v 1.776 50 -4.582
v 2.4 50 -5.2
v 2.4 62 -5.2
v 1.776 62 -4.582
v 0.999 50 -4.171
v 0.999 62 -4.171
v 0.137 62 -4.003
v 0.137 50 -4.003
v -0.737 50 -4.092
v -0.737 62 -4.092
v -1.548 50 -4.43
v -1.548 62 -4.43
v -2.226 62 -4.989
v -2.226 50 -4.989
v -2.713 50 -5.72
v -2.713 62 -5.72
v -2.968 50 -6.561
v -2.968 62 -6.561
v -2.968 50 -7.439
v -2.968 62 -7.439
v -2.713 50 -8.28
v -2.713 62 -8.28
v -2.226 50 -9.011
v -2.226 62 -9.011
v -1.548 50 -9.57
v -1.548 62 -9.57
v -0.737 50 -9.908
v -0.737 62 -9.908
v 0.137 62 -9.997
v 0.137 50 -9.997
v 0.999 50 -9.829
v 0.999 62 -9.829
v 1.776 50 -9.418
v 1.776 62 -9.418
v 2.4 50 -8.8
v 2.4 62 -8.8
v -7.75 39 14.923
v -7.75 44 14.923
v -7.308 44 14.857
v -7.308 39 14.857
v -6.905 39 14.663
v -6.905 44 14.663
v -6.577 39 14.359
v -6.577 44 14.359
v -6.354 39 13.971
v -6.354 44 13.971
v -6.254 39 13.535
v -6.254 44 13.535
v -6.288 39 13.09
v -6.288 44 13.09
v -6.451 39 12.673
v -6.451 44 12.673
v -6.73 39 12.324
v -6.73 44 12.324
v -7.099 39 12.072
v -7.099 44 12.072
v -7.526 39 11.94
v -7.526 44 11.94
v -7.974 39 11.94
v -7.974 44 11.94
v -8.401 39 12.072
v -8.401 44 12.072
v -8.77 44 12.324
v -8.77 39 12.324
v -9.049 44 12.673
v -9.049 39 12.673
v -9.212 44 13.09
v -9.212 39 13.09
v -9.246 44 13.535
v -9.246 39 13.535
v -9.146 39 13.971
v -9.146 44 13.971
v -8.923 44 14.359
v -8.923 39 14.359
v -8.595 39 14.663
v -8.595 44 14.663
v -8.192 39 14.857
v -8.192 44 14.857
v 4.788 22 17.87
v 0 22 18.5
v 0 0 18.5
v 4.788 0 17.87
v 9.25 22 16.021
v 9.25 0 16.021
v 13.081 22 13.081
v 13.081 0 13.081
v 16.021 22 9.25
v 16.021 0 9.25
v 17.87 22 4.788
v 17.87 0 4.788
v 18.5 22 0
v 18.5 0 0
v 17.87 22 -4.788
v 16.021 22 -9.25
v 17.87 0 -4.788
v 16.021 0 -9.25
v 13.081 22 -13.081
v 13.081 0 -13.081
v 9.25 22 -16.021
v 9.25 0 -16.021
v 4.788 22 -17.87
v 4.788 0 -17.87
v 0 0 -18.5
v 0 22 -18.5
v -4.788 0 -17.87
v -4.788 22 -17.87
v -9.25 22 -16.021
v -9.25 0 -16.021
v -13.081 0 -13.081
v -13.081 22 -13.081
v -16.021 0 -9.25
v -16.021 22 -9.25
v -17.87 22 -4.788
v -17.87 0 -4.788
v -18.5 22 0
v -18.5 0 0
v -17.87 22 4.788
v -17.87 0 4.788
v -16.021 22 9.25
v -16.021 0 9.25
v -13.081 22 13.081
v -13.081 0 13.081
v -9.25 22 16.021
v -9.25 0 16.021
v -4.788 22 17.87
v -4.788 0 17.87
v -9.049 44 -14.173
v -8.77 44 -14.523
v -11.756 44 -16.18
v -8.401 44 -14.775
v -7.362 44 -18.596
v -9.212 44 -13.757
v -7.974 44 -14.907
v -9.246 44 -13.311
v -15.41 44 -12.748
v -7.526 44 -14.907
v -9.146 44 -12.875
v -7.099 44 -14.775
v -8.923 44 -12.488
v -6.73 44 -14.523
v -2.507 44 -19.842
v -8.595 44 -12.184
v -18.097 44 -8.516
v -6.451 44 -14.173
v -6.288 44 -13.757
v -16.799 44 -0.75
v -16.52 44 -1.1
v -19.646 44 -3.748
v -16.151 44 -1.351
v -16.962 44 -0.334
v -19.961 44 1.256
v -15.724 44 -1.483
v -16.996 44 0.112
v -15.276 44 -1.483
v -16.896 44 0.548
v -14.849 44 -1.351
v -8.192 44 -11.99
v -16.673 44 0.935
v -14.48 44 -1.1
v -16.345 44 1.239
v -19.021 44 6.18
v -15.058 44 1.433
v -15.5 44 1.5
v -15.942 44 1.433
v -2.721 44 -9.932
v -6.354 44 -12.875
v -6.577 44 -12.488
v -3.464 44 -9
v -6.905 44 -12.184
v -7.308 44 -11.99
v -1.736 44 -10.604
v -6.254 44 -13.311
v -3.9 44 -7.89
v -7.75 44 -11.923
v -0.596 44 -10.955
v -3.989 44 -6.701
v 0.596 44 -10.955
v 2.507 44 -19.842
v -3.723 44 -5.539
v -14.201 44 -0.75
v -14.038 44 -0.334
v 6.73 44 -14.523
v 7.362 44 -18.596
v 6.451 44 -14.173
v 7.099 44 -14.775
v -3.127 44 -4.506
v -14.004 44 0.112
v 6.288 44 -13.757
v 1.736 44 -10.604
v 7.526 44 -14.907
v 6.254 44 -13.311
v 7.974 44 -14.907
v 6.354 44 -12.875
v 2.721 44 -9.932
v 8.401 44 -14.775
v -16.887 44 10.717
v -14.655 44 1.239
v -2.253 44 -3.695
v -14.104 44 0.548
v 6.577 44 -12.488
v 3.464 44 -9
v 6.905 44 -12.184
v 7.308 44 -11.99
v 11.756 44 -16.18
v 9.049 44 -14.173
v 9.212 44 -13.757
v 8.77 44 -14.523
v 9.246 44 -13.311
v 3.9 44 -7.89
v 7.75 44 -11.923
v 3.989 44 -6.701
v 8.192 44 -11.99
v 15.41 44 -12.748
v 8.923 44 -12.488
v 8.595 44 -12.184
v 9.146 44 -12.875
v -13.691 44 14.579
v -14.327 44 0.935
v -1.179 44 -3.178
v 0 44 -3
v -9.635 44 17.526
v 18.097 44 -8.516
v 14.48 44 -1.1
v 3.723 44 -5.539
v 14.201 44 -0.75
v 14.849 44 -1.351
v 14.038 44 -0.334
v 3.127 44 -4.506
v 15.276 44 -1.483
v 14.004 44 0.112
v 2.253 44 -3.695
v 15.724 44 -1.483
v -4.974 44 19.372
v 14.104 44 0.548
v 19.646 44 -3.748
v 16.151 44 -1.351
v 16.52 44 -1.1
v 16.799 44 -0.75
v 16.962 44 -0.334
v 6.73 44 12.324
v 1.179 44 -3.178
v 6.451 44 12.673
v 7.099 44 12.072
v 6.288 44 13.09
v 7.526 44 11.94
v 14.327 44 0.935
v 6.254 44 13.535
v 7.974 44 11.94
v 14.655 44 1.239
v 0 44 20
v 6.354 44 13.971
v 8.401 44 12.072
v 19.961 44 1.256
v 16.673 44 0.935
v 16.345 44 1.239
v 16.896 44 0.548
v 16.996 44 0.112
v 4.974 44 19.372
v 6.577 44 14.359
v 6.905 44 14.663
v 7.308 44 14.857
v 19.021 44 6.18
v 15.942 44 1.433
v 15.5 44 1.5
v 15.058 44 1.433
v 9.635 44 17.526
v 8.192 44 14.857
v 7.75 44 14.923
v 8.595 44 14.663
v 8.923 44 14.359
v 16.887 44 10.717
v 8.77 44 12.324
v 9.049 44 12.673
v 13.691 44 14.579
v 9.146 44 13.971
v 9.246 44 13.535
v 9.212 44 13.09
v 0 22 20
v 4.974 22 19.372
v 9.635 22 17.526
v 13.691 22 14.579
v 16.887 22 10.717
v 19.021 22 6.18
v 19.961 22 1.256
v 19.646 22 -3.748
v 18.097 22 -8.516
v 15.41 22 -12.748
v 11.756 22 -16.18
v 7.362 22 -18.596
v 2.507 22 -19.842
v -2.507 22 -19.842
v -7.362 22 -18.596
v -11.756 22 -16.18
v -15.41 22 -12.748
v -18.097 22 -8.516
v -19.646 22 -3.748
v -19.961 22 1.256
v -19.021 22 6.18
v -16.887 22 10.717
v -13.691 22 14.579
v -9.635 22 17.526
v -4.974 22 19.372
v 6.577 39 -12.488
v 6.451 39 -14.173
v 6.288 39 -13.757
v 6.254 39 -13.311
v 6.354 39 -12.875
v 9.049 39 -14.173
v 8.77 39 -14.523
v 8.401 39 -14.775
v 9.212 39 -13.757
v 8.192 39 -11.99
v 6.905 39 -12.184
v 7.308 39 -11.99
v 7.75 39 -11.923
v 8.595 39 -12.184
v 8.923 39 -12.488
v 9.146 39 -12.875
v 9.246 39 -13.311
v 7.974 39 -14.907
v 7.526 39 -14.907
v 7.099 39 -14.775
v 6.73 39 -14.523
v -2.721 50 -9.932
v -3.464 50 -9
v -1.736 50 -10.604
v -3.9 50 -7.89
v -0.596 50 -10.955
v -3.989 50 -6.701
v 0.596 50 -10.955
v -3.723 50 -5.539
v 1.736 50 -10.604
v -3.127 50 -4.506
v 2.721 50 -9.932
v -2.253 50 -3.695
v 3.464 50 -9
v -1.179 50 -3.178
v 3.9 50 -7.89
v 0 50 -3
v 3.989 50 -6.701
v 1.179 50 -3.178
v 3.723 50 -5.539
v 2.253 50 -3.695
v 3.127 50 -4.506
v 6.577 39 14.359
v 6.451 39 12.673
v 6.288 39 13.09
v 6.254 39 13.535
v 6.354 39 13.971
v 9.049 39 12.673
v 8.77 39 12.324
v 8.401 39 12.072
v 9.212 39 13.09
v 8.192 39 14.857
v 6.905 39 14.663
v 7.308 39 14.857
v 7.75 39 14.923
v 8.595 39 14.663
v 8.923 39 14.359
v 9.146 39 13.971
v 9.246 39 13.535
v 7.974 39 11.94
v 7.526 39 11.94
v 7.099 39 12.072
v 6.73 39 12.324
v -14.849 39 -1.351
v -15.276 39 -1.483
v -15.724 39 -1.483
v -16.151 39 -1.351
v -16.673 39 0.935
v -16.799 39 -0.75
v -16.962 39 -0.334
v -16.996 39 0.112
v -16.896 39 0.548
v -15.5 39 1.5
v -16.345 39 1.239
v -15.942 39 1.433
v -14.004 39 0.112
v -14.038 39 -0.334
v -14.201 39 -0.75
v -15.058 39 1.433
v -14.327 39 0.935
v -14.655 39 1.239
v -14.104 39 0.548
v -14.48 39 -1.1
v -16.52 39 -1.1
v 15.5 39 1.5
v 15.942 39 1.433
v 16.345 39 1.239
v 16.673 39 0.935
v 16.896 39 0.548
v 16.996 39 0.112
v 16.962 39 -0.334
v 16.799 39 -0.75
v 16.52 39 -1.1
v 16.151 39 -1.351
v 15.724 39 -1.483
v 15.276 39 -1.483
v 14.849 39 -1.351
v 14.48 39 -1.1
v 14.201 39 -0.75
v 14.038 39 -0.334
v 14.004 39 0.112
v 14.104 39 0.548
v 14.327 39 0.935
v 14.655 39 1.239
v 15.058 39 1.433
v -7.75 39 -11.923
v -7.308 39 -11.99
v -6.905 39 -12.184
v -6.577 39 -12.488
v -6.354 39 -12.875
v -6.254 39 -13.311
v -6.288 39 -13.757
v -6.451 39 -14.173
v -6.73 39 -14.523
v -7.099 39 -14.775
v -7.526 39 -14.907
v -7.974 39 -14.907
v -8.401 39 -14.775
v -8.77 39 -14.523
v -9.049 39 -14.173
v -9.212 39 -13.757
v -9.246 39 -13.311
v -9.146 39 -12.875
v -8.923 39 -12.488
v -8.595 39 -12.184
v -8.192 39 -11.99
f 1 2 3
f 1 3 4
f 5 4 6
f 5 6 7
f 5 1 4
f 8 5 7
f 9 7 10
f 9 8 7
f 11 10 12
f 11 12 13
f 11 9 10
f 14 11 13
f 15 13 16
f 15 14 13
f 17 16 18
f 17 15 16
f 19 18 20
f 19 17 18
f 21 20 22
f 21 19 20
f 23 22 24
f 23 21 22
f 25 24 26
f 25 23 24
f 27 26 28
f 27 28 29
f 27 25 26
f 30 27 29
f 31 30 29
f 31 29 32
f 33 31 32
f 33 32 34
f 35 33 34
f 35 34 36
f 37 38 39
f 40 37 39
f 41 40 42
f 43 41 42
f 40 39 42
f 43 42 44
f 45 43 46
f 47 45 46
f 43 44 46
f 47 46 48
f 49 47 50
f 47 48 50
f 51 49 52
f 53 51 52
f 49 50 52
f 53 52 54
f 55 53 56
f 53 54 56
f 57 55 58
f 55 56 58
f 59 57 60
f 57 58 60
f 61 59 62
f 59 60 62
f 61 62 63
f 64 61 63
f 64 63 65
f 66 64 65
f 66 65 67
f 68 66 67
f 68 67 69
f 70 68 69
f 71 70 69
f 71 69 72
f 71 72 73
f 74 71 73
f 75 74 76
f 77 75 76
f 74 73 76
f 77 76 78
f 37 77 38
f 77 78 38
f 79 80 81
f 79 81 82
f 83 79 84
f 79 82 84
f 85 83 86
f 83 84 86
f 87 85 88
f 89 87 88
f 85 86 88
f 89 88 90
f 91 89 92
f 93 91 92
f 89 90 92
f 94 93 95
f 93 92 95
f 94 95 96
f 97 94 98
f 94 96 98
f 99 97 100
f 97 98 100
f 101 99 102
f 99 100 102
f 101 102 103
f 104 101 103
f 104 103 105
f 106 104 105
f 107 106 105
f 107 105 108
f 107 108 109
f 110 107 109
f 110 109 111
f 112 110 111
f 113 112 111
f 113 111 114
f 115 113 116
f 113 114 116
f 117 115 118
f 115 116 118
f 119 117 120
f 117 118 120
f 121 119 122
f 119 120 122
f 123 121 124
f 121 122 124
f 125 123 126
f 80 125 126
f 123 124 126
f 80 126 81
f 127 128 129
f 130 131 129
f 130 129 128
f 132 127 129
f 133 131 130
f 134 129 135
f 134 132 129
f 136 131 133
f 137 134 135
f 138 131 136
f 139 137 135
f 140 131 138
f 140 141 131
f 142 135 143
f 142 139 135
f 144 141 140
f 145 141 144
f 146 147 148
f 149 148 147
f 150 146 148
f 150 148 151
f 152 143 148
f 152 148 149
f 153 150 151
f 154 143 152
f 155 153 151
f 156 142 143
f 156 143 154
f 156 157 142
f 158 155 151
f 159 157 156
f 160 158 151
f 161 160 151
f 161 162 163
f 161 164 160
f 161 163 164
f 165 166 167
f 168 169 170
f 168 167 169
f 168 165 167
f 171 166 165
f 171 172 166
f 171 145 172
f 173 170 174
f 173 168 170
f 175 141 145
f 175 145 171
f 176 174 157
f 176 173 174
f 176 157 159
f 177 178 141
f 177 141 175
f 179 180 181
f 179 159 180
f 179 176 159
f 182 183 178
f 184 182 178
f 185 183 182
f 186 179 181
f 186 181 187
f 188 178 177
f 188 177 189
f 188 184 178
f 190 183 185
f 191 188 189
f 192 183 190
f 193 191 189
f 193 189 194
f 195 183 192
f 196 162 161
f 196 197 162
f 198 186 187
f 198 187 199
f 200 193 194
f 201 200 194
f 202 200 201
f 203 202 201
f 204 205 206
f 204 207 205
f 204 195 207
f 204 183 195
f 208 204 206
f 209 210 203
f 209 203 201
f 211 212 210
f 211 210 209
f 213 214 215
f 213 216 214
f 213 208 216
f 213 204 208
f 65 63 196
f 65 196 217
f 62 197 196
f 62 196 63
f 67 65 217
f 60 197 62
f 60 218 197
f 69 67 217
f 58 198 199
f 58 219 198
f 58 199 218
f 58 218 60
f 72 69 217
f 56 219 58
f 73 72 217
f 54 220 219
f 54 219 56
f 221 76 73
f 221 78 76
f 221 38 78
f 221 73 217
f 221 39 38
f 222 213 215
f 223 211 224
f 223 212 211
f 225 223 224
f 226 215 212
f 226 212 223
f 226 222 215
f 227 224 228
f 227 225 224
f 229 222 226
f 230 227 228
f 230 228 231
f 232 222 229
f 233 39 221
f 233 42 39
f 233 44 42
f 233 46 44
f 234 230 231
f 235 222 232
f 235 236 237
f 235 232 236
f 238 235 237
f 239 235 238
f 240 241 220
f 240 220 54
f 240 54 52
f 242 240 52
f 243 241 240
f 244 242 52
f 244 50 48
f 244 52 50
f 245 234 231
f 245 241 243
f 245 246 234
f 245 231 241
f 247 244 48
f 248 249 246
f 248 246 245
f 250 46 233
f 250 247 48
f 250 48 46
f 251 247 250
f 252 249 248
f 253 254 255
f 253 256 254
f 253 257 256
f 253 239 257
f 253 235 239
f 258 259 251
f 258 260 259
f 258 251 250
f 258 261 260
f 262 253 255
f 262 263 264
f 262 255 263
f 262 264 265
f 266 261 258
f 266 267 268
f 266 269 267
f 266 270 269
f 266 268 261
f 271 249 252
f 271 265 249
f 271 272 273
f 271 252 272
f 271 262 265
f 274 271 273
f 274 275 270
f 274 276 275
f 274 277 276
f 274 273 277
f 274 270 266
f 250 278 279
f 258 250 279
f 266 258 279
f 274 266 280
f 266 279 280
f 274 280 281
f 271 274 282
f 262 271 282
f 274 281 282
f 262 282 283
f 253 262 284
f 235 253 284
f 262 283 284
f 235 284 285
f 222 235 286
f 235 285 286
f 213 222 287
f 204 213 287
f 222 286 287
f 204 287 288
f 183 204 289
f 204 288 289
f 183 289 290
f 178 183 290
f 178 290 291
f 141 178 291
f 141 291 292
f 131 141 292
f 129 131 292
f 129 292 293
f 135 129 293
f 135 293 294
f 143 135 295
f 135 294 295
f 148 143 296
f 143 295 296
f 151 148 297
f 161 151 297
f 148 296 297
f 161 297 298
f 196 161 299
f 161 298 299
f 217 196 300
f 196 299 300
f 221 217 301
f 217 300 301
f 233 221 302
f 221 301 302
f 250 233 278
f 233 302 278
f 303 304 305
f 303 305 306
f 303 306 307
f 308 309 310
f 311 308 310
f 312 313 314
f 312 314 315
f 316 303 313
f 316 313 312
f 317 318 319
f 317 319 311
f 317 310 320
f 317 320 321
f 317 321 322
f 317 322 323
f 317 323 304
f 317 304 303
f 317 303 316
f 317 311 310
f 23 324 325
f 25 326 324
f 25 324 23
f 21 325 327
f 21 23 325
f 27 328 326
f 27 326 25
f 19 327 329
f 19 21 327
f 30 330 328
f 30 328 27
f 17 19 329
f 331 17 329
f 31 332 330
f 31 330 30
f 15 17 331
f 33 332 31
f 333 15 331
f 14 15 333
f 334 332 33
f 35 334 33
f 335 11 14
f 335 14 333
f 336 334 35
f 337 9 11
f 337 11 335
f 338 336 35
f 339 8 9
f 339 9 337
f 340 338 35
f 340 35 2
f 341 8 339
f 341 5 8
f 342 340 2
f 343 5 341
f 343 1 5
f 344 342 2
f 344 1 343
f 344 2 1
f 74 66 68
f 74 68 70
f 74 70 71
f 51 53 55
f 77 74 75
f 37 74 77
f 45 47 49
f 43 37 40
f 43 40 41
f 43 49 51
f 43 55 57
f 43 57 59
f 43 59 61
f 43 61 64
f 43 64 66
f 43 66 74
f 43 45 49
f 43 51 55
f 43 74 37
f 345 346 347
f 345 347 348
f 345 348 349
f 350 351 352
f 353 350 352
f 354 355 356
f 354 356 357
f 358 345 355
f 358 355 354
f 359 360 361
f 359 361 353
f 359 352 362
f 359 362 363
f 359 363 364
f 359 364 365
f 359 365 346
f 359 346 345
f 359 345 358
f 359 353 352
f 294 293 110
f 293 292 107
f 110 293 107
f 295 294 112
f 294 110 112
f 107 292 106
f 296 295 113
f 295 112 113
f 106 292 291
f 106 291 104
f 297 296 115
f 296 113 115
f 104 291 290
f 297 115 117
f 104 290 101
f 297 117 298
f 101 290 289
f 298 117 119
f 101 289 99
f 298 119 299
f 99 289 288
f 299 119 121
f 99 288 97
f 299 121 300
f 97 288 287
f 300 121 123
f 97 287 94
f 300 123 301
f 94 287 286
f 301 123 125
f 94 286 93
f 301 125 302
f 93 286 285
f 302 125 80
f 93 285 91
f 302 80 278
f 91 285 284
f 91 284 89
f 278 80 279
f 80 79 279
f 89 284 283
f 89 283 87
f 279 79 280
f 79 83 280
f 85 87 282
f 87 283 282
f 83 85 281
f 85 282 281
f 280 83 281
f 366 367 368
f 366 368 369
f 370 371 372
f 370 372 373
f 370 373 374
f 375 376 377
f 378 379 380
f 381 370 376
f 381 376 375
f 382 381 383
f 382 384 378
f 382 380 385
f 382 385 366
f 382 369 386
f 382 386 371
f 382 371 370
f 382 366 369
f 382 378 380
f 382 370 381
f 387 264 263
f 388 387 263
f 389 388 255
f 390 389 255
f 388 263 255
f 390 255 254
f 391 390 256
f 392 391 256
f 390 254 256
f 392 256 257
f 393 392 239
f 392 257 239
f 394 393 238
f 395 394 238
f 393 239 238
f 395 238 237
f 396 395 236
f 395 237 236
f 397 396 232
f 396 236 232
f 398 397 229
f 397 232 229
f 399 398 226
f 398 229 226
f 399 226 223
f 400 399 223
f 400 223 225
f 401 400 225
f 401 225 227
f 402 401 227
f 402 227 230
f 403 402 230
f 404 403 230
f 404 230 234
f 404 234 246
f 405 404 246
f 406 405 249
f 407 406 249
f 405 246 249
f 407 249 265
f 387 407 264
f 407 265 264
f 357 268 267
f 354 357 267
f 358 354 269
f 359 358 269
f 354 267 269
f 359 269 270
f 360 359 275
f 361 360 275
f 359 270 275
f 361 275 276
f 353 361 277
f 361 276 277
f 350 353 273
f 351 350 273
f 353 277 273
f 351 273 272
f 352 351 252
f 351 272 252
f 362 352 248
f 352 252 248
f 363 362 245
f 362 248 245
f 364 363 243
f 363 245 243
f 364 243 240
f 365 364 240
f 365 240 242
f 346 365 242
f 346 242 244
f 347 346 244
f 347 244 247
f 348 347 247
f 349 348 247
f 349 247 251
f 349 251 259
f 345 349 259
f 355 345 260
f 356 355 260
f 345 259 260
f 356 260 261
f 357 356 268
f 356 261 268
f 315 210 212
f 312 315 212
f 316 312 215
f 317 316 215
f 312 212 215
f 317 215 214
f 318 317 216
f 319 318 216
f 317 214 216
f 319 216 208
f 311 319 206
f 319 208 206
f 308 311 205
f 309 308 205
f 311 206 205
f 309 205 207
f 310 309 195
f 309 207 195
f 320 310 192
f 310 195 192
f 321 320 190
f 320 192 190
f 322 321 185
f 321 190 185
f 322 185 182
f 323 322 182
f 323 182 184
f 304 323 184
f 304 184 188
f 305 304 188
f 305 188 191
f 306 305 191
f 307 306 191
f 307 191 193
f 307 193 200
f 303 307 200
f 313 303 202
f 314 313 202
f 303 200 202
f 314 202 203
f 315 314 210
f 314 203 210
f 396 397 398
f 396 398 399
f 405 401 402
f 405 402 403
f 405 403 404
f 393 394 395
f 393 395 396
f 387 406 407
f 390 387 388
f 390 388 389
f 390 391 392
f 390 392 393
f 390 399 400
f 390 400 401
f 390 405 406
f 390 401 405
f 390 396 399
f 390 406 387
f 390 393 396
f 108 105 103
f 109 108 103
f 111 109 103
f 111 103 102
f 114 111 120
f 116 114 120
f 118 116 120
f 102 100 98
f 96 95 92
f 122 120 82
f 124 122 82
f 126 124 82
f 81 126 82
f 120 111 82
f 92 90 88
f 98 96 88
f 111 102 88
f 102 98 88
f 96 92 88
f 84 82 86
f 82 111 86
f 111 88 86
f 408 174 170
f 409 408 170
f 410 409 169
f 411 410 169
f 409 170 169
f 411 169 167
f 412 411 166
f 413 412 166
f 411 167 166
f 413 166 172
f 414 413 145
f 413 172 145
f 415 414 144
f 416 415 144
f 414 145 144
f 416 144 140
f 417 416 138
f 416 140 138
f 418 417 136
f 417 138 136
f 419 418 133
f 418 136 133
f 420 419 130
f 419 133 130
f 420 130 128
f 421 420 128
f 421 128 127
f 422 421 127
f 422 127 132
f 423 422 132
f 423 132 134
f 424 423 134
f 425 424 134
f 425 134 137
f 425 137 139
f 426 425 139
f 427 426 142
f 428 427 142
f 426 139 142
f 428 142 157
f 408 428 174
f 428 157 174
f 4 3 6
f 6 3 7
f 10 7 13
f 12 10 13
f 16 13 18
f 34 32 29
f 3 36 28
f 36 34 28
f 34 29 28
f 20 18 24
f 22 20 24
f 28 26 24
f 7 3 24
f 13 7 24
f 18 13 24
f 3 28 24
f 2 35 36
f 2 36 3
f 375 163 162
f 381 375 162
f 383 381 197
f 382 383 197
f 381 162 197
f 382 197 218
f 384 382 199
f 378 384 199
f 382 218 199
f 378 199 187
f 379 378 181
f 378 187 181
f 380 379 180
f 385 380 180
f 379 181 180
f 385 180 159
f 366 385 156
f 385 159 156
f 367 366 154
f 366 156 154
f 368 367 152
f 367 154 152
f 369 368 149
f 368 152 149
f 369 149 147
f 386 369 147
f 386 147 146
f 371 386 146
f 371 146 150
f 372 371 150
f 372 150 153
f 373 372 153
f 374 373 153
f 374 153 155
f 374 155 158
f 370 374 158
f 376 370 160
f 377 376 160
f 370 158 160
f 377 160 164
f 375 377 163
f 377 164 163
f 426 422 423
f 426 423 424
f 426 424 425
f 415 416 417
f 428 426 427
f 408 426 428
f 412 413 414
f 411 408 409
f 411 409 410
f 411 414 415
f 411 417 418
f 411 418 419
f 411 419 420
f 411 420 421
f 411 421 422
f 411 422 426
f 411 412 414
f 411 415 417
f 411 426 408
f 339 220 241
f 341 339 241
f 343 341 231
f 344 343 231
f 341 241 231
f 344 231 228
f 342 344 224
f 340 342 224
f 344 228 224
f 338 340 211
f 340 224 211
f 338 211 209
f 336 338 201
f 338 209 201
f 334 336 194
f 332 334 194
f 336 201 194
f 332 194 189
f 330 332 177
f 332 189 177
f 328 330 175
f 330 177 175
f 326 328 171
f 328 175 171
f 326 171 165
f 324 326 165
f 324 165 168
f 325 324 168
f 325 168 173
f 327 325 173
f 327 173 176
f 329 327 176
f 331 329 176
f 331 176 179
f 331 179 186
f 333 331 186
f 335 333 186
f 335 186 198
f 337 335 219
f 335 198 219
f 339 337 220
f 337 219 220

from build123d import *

# Parameters (mm, degrees)
SKETCH_1_R          = 18.5
EXTRUDE_1_DEPTH     = 22
SKETCH_2_R          = 20
EXTRUDE_2_DEPTH     = 22
SKETCH_3_R          = 1.5
CUT_EXTRUDE_1_DEPTH = 5
SKETCH_4_R          = 4
EXTRUDE_3_DEPTH     = 6
EXTRUDE_4_DEPTH     = 12


with BuildPart() as part:
    # 草图1 → 凸台-拉伸1 (new body)
    with BuildSketch(Plane(origin=(0, 0, 0), x_dir=(1, 0, 0), z_dir=(0, 1, 0))):
        with Locations(Location((0, 0, 0), (0, 0, 270))):
            Circle(SKETCH_1_R)
    extrude(amount=EXTRUDE_1_DEPTH)

    # 草图2 → 凸台-拉伸2 (add)
    with BuildSketch(Plane(origin=(0, 22, 0), x_dir=(1, 0, 0), z_dir=(0, 1, 0))):
        with Locations(Location((0, 0, 0), (0, 0, 270))):
            Circle(SKETCH_2_R)
    extrude(amount=EXTRUDE_2_DEPTH)

    # 草图3 → 切除-拉伸1 (cut)
    with BuildSketch(Plane(origin=(0, 44, 0), x_dir=(1, 0, 0), z_dir=(0, 1, 0))):
        with Locations(Location((-7.75, 13.423393759, 0), (0, 0, 270))):
            Circle(SKETCH_3_R)
        with Locations(Location((-15.5, 0, 0), (0, 0, 270))):
            Circle(SKETCH_3_R)
        with Locations(Location((-7.75, -13.423393759, 0), (0, 0, 270))):
            Circle(SKETCH_3_R)
        with Locations(Location((7.75, -13.423393759, 0), (0, 0, 270))):
            Circle(SKETCH_3_R)
        with Locations(Location((15.5, 0, 0), (0, 0, 270))):
            Circle(SKETCH_3_R)
        with Locations(Location((7.75, 13.423393759, 0), (0, 0, 270))):
            Circle(SKETCH_3_R)
    extrude(amount=-CUT_EXTRUDE_1_DEPTH, mode=Mode.SUBTRACT)

    # 草图4 → 凸台-拉伸3 (add)
    with BuildSketch(Plane(origin=(0, 44, 0), x_dir=(1, 0, 0), z_dir=(0, 1, 0))):
        with Locations(Location((0, 7, 0), (0, 0, 270))):
            Circle(SKETCH_4_R)
    extrude(amount=EXTRUDE_3_DEPTH)

    # 草图5 → 凸台-拉伸4 (add)
    with BuildSketch(Plane(origin=(0, 50, 0), x_dir=(1, 0, 0), z_dir=(0, 1, 0))):
        with BuildLine():
            Line((2.4, 8.8), (2.4, 5.2))
            ThreePointArc((2.4, 5.2), (-3, 7), (2.4, 8.8))
        make_face()
    extrude(amount=EXTRUDE_4_DEPTH)


solid = part.part
